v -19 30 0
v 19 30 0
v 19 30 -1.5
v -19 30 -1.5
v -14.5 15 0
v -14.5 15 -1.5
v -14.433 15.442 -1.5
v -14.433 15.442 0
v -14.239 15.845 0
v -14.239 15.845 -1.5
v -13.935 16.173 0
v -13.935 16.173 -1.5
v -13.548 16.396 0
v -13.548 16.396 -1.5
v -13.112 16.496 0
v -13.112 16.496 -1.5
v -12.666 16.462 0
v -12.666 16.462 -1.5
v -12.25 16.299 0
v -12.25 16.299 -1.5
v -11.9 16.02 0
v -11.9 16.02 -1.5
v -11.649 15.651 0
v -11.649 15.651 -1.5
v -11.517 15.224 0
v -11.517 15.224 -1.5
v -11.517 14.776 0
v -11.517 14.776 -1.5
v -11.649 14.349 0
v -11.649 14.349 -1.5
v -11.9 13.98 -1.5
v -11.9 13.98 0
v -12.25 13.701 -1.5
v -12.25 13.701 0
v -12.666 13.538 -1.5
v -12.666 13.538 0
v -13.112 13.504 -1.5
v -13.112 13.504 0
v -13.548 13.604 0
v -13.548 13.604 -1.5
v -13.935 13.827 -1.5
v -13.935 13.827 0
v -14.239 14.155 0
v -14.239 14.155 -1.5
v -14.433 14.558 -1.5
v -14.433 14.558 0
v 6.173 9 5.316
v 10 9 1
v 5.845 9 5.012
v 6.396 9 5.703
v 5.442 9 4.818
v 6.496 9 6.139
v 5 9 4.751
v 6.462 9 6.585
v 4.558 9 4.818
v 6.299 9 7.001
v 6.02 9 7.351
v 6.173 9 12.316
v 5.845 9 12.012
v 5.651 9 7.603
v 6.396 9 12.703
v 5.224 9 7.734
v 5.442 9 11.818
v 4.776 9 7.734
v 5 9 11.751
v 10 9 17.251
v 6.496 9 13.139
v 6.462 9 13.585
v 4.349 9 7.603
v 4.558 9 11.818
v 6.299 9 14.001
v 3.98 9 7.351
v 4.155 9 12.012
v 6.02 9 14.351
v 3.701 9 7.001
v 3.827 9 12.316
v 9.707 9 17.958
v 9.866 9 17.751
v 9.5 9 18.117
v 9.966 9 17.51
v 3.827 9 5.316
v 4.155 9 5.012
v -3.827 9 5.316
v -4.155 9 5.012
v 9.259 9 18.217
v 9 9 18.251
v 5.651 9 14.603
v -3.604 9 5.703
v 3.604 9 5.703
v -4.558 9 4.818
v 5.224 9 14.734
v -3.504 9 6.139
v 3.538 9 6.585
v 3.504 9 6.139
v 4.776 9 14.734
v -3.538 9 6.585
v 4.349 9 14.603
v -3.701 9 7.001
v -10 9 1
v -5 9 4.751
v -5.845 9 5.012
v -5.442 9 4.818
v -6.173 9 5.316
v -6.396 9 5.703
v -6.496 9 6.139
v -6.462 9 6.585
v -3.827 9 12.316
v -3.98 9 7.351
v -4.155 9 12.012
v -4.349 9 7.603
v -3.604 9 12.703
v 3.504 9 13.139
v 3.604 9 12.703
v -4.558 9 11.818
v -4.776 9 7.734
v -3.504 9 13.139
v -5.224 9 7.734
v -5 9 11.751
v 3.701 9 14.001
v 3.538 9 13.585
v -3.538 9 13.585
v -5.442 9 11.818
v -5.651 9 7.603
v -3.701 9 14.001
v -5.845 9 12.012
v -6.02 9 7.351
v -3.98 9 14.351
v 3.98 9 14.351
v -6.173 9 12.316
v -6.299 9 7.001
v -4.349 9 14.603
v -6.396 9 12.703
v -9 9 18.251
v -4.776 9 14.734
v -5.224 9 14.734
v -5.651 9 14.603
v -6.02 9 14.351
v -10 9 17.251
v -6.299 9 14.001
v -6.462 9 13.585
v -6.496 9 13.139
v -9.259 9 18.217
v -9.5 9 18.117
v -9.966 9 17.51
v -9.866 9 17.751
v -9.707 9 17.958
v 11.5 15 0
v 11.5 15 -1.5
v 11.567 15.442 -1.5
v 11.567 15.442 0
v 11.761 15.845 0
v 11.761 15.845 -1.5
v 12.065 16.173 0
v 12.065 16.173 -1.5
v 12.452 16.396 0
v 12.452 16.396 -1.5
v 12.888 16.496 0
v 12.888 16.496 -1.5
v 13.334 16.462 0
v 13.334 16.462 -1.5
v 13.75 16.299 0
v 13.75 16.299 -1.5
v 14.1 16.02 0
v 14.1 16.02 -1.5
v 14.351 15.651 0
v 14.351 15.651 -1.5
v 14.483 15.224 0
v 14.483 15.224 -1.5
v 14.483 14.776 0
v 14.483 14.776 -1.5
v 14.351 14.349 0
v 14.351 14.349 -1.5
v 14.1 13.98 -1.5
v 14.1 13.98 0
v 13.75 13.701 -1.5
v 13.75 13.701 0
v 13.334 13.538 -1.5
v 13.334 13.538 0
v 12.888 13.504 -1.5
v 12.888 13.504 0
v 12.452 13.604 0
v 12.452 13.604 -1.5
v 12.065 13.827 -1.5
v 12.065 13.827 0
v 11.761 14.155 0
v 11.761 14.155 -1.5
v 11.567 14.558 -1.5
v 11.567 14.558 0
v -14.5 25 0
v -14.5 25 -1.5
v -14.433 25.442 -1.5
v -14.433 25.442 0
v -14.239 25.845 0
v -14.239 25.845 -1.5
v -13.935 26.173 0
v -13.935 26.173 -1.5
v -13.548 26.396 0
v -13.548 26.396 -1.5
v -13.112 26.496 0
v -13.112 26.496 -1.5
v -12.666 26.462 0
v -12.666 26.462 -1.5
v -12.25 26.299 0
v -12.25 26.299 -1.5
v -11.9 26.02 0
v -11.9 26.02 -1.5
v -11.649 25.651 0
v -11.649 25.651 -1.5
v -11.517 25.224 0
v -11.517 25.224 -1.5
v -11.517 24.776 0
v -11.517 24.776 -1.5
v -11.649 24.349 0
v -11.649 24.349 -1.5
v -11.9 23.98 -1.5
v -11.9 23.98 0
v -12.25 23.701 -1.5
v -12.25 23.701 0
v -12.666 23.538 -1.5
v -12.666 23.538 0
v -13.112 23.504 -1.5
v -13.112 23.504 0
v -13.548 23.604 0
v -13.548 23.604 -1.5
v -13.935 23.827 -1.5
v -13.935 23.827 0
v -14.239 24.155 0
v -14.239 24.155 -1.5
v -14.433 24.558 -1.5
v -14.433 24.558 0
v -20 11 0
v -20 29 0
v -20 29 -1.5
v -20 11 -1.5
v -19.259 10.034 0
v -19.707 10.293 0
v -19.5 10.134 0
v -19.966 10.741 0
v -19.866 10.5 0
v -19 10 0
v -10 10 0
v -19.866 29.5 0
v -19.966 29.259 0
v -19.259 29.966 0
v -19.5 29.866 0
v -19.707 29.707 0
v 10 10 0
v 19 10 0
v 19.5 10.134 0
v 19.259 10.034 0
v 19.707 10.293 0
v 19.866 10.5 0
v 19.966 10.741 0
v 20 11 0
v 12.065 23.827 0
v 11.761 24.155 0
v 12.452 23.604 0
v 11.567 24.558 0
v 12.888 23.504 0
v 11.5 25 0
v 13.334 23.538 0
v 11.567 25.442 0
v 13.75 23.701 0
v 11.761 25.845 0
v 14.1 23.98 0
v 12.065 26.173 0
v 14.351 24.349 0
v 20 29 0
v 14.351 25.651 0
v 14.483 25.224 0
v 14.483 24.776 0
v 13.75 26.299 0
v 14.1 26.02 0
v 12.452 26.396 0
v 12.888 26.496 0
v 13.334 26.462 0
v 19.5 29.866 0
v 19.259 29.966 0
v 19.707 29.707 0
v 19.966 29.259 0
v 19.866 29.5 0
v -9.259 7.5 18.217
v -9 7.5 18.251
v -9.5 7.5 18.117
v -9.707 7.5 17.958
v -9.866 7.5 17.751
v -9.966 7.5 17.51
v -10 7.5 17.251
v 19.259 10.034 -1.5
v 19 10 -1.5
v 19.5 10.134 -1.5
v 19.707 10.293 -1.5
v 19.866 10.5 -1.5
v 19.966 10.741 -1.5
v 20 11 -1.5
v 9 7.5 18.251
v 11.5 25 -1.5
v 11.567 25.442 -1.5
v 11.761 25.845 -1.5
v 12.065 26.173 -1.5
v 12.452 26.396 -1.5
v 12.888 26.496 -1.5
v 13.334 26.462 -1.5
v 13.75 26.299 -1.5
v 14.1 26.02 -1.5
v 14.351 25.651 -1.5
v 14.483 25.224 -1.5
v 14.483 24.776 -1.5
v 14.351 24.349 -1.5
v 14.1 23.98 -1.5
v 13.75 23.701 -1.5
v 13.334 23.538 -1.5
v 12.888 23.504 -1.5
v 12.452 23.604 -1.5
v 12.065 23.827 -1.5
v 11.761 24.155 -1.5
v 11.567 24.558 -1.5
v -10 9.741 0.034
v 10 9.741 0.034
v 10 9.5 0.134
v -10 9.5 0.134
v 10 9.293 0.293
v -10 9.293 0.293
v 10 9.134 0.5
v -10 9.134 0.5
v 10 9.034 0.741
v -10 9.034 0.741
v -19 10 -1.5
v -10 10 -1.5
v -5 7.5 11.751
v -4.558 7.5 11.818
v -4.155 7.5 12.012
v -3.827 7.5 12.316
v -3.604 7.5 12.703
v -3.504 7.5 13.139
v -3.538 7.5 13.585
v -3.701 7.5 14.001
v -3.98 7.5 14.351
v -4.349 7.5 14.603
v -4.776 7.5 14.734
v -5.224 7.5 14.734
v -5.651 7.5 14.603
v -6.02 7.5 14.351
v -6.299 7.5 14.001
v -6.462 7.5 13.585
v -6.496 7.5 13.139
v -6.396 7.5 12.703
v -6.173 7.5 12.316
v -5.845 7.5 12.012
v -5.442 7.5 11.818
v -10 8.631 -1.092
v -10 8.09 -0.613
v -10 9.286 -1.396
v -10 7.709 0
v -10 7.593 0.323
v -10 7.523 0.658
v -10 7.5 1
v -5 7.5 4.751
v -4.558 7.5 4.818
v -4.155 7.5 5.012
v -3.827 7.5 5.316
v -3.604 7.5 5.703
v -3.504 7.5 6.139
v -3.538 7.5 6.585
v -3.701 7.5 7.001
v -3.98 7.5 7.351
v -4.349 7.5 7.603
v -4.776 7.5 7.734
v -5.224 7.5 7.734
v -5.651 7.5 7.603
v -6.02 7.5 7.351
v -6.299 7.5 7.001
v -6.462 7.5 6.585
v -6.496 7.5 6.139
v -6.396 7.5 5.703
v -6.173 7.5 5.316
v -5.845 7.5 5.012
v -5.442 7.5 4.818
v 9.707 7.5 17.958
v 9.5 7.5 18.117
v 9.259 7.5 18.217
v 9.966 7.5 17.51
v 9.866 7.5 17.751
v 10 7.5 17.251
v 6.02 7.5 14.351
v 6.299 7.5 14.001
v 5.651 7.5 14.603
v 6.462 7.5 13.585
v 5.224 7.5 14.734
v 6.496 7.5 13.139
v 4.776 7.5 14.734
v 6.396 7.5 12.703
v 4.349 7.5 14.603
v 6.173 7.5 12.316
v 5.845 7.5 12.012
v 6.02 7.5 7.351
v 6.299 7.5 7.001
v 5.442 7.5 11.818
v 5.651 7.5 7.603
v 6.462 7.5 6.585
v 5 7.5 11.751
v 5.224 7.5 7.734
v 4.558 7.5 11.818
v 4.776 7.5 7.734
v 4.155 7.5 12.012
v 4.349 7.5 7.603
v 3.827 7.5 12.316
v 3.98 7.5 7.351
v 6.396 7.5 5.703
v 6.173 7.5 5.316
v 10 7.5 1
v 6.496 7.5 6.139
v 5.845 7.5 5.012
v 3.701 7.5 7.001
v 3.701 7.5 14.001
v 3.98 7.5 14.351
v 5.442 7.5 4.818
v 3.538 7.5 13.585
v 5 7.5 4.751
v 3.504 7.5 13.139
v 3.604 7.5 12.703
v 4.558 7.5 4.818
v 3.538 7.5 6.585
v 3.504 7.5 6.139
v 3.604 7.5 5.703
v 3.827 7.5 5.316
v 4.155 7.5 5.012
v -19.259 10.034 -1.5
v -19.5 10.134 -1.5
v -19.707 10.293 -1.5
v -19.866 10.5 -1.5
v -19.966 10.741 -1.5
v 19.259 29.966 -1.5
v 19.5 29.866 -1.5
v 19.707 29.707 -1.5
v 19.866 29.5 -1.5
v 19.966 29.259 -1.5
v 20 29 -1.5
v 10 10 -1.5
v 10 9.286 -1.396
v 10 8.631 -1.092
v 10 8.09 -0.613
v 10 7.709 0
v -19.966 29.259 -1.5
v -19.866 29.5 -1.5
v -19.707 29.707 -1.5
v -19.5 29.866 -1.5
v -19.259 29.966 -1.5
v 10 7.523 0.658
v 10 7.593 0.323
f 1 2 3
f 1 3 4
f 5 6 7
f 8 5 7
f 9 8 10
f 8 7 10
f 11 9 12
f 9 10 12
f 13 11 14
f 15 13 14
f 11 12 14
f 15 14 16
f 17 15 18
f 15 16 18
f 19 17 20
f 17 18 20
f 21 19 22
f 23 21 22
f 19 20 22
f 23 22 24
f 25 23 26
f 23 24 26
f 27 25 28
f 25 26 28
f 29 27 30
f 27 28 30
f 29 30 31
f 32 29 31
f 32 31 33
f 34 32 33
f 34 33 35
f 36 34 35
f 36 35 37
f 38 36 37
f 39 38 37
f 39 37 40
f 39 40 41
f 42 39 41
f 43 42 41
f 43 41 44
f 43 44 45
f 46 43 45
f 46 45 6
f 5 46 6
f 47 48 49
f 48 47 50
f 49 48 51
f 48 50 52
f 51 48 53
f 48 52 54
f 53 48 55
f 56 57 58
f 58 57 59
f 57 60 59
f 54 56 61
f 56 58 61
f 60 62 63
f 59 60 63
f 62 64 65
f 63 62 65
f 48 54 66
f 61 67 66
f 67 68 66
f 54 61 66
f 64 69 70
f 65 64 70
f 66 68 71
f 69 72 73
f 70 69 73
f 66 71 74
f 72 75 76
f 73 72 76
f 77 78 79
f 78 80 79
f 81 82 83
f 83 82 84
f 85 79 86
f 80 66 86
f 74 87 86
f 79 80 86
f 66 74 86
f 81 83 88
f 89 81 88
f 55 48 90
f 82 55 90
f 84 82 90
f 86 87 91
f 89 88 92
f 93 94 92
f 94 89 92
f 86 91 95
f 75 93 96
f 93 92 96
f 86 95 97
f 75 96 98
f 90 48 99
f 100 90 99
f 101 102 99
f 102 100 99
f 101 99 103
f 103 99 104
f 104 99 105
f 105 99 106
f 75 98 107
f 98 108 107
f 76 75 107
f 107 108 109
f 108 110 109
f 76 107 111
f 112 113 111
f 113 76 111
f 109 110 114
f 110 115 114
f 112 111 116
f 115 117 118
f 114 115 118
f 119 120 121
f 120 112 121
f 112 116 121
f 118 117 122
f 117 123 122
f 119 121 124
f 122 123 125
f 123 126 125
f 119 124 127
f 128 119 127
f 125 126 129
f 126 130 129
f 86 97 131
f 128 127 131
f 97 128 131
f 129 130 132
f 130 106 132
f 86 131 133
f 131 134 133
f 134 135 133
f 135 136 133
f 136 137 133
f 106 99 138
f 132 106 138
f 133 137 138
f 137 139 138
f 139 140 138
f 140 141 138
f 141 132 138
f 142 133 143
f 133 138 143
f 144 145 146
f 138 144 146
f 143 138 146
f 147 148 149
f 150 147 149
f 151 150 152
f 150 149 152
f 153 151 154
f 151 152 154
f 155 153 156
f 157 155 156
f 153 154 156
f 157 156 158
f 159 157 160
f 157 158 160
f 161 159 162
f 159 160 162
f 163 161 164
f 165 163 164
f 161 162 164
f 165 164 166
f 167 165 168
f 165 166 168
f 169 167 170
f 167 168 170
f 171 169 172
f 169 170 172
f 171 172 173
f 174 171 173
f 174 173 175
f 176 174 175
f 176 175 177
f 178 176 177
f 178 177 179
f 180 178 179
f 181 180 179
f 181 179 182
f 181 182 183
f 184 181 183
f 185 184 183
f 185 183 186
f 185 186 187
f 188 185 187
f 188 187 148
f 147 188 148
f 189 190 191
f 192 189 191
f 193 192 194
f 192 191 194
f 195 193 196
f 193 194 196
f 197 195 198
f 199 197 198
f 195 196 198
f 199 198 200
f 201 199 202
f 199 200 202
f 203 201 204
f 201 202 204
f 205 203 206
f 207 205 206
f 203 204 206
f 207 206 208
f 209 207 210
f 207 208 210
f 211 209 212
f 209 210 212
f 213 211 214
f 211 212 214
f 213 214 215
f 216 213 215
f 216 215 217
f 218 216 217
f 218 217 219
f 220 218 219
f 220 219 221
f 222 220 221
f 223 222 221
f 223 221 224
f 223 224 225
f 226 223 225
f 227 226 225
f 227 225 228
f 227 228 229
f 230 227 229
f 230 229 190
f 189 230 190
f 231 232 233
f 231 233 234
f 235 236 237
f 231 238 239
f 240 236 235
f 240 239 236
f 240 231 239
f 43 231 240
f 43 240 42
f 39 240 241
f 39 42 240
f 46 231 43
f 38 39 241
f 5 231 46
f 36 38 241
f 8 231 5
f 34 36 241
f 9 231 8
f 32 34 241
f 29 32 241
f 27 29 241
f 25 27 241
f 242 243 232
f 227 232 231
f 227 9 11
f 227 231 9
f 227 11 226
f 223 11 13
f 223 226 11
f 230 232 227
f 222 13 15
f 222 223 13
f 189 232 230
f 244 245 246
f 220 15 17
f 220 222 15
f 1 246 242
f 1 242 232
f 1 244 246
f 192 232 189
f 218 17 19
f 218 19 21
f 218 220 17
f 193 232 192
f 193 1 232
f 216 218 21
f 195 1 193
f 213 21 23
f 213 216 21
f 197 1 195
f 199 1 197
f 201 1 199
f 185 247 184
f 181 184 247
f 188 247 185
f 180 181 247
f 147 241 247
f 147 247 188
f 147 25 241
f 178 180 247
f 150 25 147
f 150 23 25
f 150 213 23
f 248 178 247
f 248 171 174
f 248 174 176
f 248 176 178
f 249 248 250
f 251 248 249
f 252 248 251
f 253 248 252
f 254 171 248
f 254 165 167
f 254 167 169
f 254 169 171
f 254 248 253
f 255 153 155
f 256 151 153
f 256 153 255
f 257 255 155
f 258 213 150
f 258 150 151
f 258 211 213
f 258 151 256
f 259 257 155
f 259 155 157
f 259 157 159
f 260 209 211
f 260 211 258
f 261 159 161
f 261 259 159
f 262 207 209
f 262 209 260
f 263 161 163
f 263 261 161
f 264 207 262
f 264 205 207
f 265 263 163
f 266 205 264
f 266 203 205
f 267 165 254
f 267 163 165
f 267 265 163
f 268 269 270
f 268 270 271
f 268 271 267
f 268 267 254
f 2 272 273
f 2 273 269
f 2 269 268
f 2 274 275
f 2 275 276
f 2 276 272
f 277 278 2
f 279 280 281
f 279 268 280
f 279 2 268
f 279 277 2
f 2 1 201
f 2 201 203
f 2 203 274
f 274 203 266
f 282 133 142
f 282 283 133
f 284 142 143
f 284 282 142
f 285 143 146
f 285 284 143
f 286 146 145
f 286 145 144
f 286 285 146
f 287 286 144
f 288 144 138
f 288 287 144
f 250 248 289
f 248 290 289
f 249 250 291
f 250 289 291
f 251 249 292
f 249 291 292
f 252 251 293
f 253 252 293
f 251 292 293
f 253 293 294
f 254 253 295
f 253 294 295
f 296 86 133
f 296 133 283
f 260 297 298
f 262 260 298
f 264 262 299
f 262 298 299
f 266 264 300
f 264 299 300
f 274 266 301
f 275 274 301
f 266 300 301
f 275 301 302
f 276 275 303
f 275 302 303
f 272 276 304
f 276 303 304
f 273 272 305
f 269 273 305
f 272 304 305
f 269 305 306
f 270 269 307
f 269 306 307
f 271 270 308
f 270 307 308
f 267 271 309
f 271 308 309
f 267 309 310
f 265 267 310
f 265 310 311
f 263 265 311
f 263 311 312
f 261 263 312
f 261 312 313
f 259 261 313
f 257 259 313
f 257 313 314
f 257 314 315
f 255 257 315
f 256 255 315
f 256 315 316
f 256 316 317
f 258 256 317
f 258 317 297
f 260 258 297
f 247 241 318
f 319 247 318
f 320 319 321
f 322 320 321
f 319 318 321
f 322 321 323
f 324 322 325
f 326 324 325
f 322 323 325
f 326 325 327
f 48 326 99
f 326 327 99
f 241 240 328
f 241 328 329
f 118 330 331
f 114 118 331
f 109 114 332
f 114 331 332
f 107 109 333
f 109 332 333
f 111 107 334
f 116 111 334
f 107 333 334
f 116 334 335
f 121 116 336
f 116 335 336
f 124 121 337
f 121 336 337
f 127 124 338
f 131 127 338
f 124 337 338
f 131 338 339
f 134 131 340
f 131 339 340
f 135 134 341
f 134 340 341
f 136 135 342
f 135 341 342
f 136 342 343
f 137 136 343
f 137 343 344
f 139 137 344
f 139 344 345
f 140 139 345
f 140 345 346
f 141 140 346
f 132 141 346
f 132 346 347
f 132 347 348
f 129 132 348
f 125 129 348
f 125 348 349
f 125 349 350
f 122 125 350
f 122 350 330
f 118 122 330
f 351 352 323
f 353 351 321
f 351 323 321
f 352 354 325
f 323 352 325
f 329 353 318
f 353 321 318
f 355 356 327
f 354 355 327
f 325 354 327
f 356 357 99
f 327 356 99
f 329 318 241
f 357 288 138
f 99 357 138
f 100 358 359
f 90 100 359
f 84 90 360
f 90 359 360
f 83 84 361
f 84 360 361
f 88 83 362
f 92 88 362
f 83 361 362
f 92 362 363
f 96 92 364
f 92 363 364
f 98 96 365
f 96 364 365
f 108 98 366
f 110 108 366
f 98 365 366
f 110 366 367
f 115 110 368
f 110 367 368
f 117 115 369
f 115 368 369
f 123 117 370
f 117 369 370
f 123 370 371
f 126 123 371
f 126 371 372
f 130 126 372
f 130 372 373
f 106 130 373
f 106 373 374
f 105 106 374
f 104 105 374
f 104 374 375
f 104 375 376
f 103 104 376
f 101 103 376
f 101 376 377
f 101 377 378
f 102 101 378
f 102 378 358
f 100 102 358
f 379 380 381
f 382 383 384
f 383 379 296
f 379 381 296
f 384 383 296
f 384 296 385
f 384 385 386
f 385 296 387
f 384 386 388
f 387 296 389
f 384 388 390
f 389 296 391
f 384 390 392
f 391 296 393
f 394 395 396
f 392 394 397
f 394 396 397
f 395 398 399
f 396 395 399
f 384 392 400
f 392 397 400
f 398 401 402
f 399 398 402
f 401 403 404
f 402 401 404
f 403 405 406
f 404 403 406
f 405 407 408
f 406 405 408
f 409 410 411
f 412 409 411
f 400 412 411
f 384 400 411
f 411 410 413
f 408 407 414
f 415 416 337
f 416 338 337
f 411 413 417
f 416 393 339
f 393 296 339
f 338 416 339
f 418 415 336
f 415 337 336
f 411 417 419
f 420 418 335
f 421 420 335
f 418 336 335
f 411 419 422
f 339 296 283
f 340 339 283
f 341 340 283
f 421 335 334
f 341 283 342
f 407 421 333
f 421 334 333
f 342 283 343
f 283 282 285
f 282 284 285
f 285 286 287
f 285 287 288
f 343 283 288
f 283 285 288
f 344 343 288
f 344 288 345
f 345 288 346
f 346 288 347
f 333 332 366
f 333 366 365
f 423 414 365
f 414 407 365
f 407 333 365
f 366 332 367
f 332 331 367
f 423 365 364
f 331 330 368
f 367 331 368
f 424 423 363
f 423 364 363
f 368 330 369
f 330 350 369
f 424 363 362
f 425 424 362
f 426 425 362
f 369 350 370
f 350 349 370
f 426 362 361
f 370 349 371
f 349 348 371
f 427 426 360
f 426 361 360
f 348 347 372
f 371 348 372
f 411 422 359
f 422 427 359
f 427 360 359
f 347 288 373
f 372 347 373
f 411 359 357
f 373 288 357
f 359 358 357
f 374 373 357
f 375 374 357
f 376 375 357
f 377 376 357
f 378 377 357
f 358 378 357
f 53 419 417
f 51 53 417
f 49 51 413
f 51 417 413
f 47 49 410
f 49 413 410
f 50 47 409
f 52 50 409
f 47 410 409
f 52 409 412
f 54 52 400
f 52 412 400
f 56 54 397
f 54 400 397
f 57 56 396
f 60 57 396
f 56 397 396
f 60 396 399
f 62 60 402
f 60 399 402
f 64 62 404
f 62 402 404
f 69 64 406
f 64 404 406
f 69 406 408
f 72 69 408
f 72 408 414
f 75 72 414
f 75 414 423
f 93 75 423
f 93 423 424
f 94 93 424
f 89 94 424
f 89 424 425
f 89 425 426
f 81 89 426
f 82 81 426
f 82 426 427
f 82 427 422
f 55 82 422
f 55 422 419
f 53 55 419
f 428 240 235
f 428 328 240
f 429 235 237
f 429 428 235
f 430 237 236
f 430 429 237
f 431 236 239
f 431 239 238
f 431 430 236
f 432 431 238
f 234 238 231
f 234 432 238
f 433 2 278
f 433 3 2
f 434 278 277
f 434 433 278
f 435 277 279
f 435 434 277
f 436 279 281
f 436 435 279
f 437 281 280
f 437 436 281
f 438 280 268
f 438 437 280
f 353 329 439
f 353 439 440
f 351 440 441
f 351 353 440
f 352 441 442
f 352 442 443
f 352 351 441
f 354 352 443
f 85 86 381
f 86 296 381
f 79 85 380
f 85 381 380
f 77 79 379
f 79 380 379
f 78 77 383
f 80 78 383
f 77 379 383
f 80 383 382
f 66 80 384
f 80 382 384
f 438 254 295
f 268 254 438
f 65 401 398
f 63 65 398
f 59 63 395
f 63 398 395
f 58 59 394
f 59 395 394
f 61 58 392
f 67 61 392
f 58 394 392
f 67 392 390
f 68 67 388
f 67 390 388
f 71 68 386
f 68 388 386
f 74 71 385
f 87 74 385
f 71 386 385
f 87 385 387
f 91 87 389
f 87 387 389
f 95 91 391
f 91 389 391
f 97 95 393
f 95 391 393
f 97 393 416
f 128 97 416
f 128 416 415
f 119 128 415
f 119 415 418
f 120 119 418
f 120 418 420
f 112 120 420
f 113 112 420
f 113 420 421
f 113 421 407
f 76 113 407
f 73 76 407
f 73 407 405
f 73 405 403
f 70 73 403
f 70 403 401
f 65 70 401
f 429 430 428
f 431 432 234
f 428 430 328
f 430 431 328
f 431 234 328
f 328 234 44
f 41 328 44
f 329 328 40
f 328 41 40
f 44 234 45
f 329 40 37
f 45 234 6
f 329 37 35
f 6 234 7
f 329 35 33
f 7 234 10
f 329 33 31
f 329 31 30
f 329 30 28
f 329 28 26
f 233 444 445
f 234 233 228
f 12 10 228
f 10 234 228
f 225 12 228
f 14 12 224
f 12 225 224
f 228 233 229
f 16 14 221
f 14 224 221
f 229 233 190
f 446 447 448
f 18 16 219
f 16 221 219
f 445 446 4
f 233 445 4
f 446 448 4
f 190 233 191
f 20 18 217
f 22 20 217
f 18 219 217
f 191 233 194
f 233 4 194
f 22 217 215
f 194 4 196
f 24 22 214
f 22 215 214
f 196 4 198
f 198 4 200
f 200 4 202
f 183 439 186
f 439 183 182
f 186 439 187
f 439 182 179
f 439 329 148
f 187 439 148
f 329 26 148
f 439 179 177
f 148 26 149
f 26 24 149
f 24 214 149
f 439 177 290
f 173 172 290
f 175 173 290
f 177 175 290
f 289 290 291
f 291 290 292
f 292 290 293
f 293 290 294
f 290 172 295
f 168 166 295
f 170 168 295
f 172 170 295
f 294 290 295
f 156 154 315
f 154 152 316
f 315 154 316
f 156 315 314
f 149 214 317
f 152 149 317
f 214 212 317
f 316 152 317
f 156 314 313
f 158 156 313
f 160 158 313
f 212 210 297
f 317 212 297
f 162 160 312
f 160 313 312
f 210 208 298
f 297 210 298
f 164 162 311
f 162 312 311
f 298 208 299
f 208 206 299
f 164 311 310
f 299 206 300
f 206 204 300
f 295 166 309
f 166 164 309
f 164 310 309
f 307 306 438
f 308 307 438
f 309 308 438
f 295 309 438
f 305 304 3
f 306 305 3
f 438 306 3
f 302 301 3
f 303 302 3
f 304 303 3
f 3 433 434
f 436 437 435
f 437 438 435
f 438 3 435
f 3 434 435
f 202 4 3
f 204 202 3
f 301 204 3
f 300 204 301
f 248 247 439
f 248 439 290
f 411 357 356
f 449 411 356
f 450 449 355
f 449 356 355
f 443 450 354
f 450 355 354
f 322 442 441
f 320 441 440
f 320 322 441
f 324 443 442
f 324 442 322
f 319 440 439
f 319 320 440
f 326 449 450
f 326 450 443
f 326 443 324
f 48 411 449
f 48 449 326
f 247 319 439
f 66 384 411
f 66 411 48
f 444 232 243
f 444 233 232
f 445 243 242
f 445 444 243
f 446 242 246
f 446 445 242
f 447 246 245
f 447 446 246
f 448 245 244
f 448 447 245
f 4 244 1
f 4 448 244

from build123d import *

# Parameters (mm, degrees)
SM_BASE_FLANGE_1_DEPTH = 1.5
OTHER_START            = -10
OTHER_1_DEPTH          = 20
OTHER_1_2_DEPTH        = 20
FILLET_1_R             = 1
SKETCH_7_R             = 1.5
CUT_EXTRUDE_1_DEPTH    = 10
SKETCH_8_R             = 1.5
CUT_EXTRUDE_2_DEPTH    = 10


# Read off the part's stored shape, not the designer's step: 绘制的折弯1
# Sheet-metal steps are written as plain solids
with BuildPart() as part:
    # Sketch 1 → 基体-法兰1 (new body)
    with BuildSketch(Plane.XY):
        Polygon((10, 10), (20, 10), (20, 30), (-20, 30), (-20, 10), (-10, 10), (-10, -10), (10, -10), align=None)
    extrude(amount=-SM_BASE_FLANGE_1_DEPTH)

    # Other 1 outline → Other 1 (cut)
    with BuildSketch(Plane.YZ.offset(OTHER_START)):
        with BuildLine():
            ThreePointArc((10, -1.5), (8.630693606, -1.091650066), (7.708712152, 0))
            Line((7.708712152, 0), (-10, 0))
            Line((-10, 0), (-10, -1.5))
            Line((-10, -1.5), (10, -1.5))
        make_face()
    extrude(amount=OTHER_1_DEPTH, mode=Mode.SUBTRACT)

    # Other 1 2 outline → Other 1 2 (add)
    with BuildSketch(Plane.YZ.offset(OTHER_START)):
        with BuildLine():
            Line((9, 18.251106428), (7.5, 18.251106428))
            Line((7.5, 18.251106428), (7.5, 1))
            ThreePointArc((7.5, 1), (7.552734218, 0.489225891), (7.708712152, 0))
            Line((7.708712152, 0), (10, 0))
            ThreePointArc((10, 0), (9.292893219, 0.292893219), (9, 1))
            Line((9, 1), (9, 18.251106428))
        make_face()
    extrude(amount=OTHER_1_2_DEPTH)

    # 圆角1
    fillet_1_edges = [part.edges().sort_by_distance(p)[0] for p in [
        (10, 8.25, 18.251106428),
        (-10, 8.25, 18.251106428),
        (20, 30, -0.75),
        (-20, 30, -0.75),
        (-20, 10, -0.75),
        (20, 10, -0.75),
    ]]
    fillet(fillet_1_edges, radius=FILLET_1_R)

    # 草图7 → 切除-拉伸1 (cut)
    with BuildSketch(Plane(origin=(0, 0, -1.5), x_dir=(-1, 0, 0), z_dir=(0, 0, -1))):
        with Locations((-13, 25)):
            Circle(SKETCH_7_R)
        with Locations((13, 25)):
            Circle(SKETCH_7_R)
        with Locations((-13, 15)):
            Circle(SKETCH_7_R)
        with Locations((13, 15)):
            Circle(SKETCH_7_R)
    extrude(amount=-CUT_EXTRUDE_1_DEPTH, mode=Mode.SUBTRACT)

    # 草图8 → 切除-拉伸2 (cut)
    with BuildSketch(Plane.XZ.offset(-7.5)):
        with Locations(Location((-5, 13.251106428, 0), (0, 0, 270))):
            Circle(SKETCH_8_R)
        with Locations(Location((5, 13.251106428, 0), (0, 0, 270))):
            Circle(SKETCH_8_R)
        with Locations(Location((-5, 6.251106428, 0), (0, 0, 270))):
            Circle(SKETCH_8_R)
        with Locations(Location((5, 6.251106428, 0), (0, 0, 270))):
            Circle(SKETCH_8_R)
    extrude(amount=-CUT_EXTRUDE_2_DEPTH, mode=Mode.SUBTRACT)


solid = part.part
